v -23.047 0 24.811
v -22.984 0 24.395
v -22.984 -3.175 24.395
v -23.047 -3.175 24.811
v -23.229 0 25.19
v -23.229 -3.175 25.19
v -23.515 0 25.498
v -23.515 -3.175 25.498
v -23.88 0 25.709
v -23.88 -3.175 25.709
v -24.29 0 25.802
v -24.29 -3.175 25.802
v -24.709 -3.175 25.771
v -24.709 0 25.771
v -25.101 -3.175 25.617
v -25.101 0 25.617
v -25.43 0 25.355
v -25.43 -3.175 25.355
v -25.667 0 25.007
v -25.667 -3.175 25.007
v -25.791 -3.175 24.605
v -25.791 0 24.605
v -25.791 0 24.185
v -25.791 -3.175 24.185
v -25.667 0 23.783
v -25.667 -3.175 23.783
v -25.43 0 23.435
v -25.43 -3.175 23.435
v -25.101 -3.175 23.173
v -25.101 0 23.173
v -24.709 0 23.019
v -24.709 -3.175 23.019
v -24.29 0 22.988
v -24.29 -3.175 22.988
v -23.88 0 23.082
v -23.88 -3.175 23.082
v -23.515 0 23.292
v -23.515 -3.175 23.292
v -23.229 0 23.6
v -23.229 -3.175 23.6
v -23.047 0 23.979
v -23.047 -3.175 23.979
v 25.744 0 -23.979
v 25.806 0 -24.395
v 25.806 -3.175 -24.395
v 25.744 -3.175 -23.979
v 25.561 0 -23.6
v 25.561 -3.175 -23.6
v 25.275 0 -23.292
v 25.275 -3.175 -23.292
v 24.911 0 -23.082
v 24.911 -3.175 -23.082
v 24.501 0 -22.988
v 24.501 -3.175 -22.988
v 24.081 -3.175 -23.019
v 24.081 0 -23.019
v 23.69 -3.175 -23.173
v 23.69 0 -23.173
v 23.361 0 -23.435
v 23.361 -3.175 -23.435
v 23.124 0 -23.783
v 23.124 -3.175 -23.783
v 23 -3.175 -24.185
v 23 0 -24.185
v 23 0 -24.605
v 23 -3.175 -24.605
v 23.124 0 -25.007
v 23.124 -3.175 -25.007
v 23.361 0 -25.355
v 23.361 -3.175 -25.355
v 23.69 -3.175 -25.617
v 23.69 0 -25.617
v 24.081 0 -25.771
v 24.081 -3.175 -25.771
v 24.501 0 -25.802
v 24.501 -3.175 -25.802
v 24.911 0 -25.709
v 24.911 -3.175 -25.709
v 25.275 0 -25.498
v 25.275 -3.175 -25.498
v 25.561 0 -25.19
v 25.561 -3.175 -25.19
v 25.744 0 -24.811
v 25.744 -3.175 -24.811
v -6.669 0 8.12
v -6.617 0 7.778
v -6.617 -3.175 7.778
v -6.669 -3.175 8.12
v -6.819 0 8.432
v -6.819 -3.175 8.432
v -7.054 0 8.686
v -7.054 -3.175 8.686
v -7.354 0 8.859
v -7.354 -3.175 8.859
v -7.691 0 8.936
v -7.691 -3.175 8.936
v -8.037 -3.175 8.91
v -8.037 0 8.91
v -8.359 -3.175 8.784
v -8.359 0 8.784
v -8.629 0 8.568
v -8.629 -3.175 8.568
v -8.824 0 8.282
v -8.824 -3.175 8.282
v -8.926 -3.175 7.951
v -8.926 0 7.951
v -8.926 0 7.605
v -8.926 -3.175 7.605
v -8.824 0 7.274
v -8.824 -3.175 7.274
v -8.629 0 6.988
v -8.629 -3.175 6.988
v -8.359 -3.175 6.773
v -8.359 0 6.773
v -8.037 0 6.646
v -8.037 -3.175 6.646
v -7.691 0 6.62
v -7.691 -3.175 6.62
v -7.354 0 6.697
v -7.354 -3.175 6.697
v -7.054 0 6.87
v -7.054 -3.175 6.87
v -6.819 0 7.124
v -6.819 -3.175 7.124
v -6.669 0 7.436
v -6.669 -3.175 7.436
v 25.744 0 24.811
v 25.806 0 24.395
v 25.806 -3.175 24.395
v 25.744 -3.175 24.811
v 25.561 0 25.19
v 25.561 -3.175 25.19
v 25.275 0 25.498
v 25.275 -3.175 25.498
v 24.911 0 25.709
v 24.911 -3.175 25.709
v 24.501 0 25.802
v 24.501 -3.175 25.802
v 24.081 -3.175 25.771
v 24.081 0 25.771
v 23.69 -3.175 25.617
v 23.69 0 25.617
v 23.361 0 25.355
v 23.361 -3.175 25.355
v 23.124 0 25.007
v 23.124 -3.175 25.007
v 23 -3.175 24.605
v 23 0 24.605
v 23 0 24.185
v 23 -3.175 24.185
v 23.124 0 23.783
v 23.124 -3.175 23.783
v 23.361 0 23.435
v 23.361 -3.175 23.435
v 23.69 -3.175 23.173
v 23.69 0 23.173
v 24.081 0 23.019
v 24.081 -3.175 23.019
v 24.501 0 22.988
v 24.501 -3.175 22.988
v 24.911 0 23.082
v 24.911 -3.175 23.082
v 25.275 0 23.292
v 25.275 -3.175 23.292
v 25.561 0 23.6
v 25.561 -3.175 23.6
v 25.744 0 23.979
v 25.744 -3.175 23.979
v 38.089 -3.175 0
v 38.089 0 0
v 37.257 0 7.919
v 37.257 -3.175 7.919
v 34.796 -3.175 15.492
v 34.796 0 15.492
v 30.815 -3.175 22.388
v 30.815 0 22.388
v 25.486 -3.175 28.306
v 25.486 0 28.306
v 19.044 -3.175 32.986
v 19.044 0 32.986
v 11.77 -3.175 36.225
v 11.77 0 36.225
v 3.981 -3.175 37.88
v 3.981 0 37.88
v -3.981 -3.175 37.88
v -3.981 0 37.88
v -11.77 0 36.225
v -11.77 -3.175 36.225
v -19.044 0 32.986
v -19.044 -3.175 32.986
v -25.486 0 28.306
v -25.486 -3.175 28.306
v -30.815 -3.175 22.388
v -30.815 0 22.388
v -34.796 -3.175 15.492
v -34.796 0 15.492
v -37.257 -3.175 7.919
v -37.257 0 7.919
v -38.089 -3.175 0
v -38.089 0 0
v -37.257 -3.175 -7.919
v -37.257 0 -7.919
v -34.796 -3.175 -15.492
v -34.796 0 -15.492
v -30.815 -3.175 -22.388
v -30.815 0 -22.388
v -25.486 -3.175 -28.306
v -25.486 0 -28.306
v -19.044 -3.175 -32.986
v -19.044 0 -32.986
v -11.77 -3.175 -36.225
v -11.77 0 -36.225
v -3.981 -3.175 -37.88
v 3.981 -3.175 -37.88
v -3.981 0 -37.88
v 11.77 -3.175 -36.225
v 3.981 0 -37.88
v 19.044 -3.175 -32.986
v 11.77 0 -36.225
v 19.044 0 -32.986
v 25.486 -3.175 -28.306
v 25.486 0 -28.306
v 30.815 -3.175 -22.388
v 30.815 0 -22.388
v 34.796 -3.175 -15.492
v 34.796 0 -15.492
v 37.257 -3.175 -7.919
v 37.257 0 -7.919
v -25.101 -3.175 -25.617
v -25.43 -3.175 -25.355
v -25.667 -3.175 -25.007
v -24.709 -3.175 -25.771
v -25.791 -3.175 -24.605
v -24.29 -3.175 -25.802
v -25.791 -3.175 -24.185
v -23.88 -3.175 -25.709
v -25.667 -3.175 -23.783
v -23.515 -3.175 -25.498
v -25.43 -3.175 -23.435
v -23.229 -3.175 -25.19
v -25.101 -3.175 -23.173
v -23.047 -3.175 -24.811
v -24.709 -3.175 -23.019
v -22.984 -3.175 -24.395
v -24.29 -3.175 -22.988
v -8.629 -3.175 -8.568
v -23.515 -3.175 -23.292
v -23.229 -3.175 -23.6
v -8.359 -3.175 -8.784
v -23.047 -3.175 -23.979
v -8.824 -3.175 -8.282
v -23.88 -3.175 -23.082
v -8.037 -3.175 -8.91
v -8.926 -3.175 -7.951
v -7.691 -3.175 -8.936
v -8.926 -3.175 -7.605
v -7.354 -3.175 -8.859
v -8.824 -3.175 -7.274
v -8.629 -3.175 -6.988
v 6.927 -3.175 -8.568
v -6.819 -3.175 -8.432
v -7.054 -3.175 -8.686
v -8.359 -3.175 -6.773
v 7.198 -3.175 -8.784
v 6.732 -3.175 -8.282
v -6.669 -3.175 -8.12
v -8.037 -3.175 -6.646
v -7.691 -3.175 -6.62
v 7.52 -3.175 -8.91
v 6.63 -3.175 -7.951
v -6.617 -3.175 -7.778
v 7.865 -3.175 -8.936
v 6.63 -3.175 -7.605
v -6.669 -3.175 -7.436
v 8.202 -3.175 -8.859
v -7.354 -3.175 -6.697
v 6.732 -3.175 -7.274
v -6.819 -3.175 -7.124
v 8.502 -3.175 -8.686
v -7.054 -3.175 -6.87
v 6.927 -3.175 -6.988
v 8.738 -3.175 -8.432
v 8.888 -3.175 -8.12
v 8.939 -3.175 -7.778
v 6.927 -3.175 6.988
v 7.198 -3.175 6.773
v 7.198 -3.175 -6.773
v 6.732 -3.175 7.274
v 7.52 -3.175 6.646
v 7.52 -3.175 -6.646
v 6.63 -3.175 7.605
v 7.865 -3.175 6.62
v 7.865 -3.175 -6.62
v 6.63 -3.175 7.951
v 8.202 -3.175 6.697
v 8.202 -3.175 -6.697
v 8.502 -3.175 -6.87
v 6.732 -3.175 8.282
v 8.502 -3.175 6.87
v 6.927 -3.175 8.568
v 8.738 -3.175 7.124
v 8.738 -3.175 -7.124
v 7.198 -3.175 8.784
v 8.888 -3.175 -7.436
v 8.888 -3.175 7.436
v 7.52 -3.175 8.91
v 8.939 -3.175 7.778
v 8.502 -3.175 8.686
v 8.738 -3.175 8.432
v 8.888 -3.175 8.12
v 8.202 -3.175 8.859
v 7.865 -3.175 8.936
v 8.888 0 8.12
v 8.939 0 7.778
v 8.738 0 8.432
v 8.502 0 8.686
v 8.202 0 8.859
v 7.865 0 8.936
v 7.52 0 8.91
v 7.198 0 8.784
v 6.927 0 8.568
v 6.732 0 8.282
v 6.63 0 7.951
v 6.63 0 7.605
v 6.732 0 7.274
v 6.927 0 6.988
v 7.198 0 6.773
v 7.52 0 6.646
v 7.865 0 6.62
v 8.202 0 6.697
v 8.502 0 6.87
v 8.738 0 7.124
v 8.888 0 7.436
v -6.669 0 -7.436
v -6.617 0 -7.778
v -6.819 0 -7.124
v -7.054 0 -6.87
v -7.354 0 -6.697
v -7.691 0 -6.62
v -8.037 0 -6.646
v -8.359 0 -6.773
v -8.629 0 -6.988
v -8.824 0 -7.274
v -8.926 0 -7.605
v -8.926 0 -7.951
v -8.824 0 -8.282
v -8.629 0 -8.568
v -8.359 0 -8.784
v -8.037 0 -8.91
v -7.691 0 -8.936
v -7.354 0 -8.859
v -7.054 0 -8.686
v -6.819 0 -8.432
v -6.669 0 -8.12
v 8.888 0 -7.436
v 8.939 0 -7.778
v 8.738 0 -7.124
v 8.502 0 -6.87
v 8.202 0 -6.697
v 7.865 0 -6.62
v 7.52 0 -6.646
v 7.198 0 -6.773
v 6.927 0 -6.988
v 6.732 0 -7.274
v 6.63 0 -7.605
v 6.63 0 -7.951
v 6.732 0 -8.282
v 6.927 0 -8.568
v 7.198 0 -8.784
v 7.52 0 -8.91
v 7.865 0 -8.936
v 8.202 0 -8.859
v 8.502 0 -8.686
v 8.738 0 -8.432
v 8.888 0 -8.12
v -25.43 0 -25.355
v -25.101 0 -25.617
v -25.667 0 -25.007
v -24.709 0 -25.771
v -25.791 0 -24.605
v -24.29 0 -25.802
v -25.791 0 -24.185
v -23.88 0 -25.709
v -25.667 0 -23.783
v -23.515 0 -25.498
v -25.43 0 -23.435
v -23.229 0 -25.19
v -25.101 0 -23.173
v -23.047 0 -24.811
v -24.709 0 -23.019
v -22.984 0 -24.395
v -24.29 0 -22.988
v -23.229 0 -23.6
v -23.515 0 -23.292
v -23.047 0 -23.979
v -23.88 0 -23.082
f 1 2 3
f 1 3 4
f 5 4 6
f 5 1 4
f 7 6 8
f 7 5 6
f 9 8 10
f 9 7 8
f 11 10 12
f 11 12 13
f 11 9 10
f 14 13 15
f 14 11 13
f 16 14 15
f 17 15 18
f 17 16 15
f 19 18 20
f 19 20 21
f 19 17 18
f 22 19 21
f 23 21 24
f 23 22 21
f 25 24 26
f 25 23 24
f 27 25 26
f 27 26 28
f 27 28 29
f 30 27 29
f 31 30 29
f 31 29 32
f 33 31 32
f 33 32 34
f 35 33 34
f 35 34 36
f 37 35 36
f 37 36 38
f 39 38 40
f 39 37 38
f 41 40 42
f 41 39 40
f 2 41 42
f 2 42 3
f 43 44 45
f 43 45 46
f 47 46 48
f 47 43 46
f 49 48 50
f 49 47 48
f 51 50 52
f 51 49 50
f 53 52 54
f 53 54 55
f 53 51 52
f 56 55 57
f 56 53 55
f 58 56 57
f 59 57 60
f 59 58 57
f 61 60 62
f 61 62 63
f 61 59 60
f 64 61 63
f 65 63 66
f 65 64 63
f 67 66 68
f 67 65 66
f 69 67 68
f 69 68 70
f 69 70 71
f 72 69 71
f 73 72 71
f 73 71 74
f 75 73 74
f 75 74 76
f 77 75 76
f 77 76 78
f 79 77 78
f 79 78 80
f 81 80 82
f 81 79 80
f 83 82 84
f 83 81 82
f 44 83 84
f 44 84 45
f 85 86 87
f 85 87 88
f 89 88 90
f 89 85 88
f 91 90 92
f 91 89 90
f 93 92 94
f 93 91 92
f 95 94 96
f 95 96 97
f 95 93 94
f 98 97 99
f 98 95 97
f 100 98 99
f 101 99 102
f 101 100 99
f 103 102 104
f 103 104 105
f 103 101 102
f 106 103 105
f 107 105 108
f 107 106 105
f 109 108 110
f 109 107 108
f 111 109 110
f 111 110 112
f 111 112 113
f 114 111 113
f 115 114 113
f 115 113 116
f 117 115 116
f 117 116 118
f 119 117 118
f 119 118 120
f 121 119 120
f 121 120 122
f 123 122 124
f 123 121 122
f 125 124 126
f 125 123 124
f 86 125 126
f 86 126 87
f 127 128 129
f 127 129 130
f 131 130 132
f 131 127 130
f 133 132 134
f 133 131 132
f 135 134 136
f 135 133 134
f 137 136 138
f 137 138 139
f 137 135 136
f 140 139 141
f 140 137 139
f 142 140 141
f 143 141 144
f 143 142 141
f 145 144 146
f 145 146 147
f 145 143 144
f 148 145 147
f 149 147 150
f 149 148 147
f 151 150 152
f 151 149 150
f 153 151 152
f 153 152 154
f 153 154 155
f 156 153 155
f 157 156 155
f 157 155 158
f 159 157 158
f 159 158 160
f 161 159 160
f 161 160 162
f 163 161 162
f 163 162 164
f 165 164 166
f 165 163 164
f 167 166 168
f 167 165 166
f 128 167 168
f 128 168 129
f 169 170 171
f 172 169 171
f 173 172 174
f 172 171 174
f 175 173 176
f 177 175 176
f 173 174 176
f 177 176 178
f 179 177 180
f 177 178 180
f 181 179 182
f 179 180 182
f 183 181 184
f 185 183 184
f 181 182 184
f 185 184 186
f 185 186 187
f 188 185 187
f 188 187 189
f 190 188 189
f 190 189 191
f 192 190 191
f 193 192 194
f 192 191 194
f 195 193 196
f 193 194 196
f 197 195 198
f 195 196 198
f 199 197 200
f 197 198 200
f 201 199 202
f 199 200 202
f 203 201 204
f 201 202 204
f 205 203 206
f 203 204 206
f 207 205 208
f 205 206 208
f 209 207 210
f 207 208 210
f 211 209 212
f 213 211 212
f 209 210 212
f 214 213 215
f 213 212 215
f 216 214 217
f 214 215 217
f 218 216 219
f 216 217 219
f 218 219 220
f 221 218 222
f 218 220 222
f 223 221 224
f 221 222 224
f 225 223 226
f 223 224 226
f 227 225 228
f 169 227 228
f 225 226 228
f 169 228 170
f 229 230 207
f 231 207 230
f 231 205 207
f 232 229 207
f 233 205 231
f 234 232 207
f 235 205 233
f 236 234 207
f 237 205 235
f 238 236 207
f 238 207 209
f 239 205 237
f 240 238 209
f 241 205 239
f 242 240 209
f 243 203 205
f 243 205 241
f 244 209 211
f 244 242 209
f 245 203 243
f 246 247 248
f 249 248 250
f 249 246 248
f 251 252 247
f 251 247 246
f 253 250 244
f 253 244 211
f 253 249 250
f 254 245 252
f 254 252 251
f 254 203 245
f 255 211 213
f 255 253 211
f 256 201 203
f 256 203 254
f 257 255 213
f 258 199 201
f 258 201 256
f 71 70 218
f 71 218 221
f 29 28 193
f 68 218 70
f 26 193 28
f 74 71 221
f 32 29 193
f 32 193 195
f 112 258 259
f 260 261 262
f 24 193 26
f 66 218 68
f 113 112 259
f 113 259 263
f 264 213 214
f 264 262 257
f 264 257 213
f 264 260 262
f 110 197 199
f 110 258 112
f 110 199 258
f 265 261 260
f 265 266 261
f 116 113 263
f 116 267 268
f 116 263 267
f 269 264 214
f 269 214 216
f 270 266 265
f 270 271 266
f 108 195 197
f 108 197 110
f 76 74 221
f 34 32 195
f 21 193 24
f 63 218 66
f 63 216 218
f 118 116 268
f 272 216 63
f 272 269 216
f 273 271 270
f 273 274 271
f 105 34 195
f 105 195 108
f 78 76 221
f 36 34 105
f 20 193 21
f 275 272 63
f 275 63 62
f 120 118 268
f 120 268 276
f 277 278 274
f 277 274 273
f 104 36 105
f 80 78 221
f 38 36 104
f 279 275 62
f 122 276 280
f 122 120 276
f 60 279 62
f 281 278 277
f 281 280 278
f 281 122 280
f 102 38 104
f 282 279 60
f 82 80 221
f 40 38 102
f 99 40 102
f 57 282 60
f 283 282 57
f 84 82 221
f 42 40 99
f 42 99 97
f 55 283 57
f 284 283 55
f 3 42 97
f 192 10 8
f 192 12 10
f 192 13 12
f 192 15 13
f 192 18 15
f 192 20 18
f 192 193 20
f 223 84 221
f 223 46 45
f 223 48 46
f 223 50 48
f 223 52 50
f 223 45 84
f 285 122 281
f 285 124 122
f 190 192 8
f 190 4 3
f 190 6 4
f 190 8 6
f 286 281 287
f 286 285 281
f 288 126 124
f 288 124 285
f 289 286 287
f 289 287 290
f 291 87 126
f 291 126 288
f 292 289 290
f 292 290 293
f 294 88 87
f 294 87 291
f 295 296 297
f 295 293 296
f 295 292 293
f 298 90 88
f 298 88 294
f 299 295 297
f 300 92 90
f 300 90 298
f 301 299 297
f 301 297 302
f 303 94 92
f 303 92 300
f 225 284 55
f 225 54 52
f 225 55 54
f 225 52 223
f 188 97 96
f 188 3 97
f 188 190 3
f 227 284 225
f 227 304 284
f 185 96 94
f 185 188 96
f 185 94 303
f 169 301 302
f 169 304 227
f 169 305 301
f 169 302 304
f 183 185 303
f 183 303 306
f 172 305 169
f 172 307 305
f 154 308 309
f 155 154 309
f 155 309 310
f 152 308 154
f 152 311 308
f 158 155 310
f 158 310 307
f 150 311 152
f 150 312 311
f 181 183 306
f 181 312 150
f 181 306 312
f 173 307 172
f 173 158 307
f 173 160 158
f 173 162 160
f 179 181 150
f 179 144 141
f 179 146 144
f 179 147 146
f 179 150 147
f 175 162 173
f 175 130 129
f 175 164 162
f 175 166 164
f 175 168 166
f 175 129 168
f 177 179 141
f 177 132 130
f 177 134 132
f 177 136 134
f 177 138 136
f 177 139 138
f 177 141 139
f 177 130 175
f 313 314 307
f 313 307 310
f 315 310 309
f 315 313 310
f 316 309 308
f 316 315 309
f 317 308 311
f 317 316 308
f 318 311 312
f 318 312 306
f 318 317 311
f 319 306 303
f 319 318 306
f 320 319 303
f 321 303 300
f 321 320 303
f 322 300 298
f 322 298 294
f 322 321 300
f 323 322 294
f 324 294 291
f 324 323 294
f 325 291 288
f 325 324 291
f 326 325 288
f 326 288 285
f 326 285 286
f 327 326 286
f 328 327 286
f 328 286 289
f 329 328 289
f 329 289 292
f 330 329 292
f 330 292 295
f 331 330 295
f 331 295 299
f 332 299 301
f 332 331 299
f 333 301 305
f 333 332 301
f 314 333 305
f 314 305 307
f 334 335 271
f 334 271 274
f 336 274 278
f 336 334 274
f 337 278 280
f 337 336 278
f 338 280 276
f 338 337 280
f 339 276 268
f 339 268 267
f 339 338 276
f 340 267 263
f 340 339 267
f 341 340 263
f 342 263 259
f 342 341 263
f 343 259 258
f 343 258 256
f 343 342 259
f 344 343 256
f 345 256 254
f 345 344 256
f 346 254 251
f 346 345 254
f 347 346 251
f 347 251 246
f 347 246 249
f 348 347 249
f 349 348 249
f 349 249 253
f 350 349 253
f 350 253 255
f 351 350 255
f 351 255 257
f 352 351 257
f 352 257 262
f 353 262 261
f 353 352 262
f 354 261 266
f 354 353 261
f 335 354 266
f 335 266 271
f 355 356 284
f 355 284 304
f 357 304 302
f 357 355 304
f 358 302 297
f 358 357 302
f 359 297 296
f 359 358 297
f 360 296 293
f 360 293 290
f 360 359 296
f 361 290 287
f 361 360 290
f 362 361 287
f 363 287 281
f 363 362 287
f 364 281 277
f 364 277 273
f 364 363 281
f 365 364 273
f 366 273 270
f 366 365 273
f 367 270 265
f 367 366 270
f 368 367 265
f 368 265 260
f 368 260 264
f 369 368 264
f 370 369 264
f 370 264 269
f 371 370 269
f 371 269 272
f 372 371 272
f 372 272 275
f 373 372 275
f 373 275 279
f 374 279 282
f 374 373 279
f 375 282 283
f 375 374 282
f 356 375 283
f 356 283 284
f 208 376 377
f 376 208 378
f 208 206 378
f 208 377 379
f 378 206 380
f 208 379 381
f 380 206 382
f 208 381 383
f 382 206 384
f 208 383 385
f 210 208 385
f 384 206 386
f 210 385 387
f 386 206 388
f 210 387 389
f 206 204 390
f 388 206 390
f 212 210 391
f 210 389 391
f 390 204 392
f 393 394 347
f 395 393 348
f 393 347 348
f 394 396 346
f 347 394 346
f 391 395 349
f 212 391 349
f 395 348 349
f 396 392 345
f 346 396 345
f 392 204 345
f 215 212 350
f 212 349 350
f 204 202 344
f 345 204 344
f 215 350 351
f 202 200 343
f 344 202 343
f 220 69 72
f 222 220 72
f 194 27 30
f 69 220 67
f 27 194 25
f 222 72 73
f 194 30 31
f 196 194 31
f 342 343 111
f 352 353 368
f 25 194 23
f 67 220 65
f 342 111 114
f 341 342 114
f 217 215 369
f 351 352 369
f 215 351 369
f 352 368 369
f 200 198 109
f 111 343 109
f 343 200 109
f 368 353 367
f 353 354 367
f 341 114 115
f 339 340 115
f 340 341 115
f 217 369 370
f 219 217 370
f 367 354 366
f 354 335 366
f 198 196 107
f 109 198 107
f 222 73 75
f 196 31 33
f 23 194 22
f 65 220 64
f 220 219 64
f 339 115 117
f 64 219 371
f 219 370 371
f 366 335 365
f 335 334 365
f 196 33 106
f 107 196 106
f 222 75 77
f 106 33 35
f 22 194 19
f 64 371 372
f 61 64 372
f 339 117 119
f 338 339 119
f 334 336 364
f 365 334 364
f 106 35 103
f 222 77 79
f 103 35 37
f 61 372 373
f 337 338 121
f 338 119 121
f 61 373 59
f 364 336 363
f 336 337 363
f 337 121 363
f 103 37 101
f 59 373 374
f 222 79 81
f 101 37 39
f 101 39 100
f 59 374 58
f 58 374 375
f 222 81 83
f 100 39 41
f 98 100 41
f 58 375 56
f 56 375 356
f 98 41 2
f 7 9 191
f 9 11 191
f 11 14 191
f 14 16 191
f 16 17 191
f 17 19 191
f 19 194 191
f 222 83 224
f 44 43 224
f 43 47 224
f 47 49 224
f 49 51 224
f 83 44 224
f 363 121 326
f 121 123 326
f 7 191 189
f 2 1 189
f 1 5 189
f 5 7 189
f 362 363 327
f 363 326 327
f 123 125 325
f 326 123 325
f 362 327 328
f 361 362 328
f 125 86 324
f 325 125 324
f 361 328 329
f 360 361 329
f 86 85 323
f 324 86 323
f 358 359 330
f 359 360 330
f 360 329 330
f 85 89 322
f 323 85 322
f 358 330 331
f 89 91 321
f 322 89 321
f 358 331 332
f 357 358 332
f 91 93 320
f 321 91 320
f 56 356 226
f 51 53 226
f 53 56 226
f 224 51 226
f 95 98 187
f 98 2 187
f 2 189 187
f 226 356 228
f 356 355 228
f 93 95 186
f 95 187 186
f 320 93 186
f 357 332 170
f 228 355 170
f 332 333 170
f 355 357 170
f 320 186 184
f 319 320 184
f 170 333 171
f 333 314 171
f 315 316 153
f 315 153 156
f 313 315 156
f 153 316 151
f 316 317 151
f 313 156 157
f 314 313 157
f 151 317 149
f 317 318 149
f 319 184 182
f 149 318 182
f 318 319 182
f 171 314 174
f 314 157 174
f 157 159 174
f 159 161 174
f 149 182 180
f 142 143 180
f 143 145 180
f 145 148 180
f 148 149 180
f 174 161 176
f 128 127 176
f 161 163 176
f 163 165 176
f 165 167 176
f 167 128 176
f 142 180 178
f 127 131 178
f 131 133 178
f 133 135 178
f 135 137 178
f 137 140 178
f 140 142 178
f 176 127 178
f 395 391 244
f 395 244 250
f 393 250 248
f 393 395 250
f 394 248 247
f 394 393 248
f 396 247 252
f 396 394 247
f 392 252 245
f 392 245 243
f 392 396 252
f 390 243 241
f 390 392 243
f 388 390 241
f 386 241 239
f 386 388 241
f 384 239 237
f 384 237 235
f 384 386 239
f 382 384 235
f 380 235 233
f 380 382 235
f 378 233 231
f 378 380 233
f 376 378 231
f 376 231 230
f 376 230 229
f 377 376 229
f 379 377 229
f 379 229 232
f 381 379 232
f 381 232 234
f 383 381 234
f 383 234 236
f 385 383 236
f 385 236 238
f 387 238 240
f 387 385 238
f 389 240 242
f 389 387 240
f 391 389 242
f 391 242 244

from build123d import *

# Parameters (mm, degrees)
F0_R     = 38.0889
F0_R_2   = 1.4111
F0_R_3   = 1.1611
F1_DEPTH = 3.175


with BuildPart() as f1:
    # F0 (on Front) → F1 (new body)
    with BuildSketch(Plane.XZ):
        Circle(F0_R)
        with Locations((-24.395184, -24.395184)):
            Circle(F0_R_2, mode=Mode.SUBTRACT)
        with Locations((-7.778175, -7.778175)):
            Circle(F0_R_3, mode=Mode.SUBTRACT)
        with Locations((24.395184, -24.395184)):
            Circle(F0_R_2, mode=Mode.SUBTRACT)
        with Locations((7.778175, -7.778175)):
            Circle(F0_R_3, mode=Mode.SUBTRACT)
        with Locations((-7.778175, 7.778175)):
            Circle(F0_R_3, mode=Mode.SUBTRACT)
        with Locations((-24.395184, 24.395184)):
            Circle(F0_R_2, mode=Mode.SUBTRACT)
        with Locations((7.778175, 7.778175)):
            Circle(F0_R_3, mode=Mode.SUBTRACT)
        with Locations((24.395184, 24.395184)):
            Circle(F0_R_2, mode=Mode.SUBTRACT)
    extrude(amount=F1_DEPTH)


solid = f1.part
